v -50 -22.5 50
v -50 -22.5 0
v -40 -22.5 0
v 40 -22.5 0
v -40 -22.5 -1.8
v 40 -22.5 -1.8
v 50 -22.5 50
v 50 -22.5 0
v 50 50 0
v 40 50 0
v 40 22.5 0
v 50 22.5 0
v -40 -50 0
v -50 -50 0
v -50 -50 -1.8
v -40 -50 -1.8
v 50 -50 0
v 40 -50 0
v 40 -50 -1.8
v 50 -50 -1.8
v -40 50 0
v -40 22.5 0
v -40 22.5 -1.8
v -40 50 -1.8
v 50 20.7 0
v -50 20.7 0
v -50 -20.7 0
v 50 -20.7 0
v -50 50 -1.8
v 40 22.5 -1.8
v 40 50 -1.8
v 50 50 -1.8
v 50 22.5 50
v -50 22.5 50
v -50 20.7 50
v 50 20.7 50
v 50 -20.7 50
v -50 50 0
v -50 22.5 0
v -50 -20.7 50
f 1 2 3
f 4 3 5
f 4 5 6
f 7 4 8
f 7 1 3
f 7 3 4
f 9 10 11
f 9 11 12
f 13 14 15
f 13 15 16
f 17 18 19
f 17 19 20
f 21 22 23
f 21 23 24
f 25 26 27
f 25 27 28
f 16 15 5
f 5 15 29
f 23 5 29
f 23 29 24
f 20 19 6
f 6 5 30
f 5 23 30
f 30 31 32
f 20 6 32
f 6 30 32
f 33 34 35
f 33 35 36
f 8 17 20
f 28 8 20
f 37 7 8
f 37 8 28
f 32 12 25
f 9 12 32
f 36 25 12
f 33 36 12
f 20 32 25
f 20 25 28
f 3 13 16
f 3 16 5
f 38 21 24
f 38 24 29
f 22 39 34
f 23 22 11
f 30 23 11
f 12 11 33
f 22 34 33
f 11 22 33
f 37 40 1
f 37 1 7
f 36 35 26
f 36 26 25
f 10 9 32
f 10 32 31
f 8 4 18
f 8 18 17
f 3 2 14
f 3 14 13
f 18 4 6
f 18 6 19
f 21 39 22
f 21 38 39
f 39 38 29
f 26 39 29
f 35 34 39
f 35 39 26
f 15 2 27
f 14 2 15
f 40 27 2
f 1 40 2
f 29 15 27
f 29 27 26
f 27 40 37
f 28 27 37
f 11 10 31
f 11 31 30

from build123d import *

# Parameters (mm, degrees)
F0_W          = 100
F0_H          = 45
F1_DEPTH      = 50
F1_DEPTH_BACK = 1.8
F2_T          = -1.8
F4_DEPTH      = 1.8


with BuildPart() as f1:
    # F0 (on Top) → F1 (new body, two sides)
    with BuildSketch(Plane.XY) as f1_sk:
        Rectangle(F0_W, F0_H)
    extrude(amount=F1_DEPTH)
    extrude(f1_sk.sketch, amount=-F1_DEPTH_BACK)

    # F2
    f2_openings = [f1.faces().sort_by_distance(p)[0] for p in [
        (0, 0, 50),
        (-50, 0, 24.1),
        (50, 0, 24.1),
    ]]
    offset(amount=F2_T, openings=f2_openings)

    # F3 (on Top) → F4 (join)
    with BuildSketch(Plane.XY):
        Polygon((-40, -50), (-40, 0), (-40, 50), (-50, 50), (-50, -50), align=None)
        Polygon((40, 50), (40, 0), (40, -50), (50, -50), (50, 50), align=None)
    extrude(amount=-F4_DEPTH)


solid = f1.part
